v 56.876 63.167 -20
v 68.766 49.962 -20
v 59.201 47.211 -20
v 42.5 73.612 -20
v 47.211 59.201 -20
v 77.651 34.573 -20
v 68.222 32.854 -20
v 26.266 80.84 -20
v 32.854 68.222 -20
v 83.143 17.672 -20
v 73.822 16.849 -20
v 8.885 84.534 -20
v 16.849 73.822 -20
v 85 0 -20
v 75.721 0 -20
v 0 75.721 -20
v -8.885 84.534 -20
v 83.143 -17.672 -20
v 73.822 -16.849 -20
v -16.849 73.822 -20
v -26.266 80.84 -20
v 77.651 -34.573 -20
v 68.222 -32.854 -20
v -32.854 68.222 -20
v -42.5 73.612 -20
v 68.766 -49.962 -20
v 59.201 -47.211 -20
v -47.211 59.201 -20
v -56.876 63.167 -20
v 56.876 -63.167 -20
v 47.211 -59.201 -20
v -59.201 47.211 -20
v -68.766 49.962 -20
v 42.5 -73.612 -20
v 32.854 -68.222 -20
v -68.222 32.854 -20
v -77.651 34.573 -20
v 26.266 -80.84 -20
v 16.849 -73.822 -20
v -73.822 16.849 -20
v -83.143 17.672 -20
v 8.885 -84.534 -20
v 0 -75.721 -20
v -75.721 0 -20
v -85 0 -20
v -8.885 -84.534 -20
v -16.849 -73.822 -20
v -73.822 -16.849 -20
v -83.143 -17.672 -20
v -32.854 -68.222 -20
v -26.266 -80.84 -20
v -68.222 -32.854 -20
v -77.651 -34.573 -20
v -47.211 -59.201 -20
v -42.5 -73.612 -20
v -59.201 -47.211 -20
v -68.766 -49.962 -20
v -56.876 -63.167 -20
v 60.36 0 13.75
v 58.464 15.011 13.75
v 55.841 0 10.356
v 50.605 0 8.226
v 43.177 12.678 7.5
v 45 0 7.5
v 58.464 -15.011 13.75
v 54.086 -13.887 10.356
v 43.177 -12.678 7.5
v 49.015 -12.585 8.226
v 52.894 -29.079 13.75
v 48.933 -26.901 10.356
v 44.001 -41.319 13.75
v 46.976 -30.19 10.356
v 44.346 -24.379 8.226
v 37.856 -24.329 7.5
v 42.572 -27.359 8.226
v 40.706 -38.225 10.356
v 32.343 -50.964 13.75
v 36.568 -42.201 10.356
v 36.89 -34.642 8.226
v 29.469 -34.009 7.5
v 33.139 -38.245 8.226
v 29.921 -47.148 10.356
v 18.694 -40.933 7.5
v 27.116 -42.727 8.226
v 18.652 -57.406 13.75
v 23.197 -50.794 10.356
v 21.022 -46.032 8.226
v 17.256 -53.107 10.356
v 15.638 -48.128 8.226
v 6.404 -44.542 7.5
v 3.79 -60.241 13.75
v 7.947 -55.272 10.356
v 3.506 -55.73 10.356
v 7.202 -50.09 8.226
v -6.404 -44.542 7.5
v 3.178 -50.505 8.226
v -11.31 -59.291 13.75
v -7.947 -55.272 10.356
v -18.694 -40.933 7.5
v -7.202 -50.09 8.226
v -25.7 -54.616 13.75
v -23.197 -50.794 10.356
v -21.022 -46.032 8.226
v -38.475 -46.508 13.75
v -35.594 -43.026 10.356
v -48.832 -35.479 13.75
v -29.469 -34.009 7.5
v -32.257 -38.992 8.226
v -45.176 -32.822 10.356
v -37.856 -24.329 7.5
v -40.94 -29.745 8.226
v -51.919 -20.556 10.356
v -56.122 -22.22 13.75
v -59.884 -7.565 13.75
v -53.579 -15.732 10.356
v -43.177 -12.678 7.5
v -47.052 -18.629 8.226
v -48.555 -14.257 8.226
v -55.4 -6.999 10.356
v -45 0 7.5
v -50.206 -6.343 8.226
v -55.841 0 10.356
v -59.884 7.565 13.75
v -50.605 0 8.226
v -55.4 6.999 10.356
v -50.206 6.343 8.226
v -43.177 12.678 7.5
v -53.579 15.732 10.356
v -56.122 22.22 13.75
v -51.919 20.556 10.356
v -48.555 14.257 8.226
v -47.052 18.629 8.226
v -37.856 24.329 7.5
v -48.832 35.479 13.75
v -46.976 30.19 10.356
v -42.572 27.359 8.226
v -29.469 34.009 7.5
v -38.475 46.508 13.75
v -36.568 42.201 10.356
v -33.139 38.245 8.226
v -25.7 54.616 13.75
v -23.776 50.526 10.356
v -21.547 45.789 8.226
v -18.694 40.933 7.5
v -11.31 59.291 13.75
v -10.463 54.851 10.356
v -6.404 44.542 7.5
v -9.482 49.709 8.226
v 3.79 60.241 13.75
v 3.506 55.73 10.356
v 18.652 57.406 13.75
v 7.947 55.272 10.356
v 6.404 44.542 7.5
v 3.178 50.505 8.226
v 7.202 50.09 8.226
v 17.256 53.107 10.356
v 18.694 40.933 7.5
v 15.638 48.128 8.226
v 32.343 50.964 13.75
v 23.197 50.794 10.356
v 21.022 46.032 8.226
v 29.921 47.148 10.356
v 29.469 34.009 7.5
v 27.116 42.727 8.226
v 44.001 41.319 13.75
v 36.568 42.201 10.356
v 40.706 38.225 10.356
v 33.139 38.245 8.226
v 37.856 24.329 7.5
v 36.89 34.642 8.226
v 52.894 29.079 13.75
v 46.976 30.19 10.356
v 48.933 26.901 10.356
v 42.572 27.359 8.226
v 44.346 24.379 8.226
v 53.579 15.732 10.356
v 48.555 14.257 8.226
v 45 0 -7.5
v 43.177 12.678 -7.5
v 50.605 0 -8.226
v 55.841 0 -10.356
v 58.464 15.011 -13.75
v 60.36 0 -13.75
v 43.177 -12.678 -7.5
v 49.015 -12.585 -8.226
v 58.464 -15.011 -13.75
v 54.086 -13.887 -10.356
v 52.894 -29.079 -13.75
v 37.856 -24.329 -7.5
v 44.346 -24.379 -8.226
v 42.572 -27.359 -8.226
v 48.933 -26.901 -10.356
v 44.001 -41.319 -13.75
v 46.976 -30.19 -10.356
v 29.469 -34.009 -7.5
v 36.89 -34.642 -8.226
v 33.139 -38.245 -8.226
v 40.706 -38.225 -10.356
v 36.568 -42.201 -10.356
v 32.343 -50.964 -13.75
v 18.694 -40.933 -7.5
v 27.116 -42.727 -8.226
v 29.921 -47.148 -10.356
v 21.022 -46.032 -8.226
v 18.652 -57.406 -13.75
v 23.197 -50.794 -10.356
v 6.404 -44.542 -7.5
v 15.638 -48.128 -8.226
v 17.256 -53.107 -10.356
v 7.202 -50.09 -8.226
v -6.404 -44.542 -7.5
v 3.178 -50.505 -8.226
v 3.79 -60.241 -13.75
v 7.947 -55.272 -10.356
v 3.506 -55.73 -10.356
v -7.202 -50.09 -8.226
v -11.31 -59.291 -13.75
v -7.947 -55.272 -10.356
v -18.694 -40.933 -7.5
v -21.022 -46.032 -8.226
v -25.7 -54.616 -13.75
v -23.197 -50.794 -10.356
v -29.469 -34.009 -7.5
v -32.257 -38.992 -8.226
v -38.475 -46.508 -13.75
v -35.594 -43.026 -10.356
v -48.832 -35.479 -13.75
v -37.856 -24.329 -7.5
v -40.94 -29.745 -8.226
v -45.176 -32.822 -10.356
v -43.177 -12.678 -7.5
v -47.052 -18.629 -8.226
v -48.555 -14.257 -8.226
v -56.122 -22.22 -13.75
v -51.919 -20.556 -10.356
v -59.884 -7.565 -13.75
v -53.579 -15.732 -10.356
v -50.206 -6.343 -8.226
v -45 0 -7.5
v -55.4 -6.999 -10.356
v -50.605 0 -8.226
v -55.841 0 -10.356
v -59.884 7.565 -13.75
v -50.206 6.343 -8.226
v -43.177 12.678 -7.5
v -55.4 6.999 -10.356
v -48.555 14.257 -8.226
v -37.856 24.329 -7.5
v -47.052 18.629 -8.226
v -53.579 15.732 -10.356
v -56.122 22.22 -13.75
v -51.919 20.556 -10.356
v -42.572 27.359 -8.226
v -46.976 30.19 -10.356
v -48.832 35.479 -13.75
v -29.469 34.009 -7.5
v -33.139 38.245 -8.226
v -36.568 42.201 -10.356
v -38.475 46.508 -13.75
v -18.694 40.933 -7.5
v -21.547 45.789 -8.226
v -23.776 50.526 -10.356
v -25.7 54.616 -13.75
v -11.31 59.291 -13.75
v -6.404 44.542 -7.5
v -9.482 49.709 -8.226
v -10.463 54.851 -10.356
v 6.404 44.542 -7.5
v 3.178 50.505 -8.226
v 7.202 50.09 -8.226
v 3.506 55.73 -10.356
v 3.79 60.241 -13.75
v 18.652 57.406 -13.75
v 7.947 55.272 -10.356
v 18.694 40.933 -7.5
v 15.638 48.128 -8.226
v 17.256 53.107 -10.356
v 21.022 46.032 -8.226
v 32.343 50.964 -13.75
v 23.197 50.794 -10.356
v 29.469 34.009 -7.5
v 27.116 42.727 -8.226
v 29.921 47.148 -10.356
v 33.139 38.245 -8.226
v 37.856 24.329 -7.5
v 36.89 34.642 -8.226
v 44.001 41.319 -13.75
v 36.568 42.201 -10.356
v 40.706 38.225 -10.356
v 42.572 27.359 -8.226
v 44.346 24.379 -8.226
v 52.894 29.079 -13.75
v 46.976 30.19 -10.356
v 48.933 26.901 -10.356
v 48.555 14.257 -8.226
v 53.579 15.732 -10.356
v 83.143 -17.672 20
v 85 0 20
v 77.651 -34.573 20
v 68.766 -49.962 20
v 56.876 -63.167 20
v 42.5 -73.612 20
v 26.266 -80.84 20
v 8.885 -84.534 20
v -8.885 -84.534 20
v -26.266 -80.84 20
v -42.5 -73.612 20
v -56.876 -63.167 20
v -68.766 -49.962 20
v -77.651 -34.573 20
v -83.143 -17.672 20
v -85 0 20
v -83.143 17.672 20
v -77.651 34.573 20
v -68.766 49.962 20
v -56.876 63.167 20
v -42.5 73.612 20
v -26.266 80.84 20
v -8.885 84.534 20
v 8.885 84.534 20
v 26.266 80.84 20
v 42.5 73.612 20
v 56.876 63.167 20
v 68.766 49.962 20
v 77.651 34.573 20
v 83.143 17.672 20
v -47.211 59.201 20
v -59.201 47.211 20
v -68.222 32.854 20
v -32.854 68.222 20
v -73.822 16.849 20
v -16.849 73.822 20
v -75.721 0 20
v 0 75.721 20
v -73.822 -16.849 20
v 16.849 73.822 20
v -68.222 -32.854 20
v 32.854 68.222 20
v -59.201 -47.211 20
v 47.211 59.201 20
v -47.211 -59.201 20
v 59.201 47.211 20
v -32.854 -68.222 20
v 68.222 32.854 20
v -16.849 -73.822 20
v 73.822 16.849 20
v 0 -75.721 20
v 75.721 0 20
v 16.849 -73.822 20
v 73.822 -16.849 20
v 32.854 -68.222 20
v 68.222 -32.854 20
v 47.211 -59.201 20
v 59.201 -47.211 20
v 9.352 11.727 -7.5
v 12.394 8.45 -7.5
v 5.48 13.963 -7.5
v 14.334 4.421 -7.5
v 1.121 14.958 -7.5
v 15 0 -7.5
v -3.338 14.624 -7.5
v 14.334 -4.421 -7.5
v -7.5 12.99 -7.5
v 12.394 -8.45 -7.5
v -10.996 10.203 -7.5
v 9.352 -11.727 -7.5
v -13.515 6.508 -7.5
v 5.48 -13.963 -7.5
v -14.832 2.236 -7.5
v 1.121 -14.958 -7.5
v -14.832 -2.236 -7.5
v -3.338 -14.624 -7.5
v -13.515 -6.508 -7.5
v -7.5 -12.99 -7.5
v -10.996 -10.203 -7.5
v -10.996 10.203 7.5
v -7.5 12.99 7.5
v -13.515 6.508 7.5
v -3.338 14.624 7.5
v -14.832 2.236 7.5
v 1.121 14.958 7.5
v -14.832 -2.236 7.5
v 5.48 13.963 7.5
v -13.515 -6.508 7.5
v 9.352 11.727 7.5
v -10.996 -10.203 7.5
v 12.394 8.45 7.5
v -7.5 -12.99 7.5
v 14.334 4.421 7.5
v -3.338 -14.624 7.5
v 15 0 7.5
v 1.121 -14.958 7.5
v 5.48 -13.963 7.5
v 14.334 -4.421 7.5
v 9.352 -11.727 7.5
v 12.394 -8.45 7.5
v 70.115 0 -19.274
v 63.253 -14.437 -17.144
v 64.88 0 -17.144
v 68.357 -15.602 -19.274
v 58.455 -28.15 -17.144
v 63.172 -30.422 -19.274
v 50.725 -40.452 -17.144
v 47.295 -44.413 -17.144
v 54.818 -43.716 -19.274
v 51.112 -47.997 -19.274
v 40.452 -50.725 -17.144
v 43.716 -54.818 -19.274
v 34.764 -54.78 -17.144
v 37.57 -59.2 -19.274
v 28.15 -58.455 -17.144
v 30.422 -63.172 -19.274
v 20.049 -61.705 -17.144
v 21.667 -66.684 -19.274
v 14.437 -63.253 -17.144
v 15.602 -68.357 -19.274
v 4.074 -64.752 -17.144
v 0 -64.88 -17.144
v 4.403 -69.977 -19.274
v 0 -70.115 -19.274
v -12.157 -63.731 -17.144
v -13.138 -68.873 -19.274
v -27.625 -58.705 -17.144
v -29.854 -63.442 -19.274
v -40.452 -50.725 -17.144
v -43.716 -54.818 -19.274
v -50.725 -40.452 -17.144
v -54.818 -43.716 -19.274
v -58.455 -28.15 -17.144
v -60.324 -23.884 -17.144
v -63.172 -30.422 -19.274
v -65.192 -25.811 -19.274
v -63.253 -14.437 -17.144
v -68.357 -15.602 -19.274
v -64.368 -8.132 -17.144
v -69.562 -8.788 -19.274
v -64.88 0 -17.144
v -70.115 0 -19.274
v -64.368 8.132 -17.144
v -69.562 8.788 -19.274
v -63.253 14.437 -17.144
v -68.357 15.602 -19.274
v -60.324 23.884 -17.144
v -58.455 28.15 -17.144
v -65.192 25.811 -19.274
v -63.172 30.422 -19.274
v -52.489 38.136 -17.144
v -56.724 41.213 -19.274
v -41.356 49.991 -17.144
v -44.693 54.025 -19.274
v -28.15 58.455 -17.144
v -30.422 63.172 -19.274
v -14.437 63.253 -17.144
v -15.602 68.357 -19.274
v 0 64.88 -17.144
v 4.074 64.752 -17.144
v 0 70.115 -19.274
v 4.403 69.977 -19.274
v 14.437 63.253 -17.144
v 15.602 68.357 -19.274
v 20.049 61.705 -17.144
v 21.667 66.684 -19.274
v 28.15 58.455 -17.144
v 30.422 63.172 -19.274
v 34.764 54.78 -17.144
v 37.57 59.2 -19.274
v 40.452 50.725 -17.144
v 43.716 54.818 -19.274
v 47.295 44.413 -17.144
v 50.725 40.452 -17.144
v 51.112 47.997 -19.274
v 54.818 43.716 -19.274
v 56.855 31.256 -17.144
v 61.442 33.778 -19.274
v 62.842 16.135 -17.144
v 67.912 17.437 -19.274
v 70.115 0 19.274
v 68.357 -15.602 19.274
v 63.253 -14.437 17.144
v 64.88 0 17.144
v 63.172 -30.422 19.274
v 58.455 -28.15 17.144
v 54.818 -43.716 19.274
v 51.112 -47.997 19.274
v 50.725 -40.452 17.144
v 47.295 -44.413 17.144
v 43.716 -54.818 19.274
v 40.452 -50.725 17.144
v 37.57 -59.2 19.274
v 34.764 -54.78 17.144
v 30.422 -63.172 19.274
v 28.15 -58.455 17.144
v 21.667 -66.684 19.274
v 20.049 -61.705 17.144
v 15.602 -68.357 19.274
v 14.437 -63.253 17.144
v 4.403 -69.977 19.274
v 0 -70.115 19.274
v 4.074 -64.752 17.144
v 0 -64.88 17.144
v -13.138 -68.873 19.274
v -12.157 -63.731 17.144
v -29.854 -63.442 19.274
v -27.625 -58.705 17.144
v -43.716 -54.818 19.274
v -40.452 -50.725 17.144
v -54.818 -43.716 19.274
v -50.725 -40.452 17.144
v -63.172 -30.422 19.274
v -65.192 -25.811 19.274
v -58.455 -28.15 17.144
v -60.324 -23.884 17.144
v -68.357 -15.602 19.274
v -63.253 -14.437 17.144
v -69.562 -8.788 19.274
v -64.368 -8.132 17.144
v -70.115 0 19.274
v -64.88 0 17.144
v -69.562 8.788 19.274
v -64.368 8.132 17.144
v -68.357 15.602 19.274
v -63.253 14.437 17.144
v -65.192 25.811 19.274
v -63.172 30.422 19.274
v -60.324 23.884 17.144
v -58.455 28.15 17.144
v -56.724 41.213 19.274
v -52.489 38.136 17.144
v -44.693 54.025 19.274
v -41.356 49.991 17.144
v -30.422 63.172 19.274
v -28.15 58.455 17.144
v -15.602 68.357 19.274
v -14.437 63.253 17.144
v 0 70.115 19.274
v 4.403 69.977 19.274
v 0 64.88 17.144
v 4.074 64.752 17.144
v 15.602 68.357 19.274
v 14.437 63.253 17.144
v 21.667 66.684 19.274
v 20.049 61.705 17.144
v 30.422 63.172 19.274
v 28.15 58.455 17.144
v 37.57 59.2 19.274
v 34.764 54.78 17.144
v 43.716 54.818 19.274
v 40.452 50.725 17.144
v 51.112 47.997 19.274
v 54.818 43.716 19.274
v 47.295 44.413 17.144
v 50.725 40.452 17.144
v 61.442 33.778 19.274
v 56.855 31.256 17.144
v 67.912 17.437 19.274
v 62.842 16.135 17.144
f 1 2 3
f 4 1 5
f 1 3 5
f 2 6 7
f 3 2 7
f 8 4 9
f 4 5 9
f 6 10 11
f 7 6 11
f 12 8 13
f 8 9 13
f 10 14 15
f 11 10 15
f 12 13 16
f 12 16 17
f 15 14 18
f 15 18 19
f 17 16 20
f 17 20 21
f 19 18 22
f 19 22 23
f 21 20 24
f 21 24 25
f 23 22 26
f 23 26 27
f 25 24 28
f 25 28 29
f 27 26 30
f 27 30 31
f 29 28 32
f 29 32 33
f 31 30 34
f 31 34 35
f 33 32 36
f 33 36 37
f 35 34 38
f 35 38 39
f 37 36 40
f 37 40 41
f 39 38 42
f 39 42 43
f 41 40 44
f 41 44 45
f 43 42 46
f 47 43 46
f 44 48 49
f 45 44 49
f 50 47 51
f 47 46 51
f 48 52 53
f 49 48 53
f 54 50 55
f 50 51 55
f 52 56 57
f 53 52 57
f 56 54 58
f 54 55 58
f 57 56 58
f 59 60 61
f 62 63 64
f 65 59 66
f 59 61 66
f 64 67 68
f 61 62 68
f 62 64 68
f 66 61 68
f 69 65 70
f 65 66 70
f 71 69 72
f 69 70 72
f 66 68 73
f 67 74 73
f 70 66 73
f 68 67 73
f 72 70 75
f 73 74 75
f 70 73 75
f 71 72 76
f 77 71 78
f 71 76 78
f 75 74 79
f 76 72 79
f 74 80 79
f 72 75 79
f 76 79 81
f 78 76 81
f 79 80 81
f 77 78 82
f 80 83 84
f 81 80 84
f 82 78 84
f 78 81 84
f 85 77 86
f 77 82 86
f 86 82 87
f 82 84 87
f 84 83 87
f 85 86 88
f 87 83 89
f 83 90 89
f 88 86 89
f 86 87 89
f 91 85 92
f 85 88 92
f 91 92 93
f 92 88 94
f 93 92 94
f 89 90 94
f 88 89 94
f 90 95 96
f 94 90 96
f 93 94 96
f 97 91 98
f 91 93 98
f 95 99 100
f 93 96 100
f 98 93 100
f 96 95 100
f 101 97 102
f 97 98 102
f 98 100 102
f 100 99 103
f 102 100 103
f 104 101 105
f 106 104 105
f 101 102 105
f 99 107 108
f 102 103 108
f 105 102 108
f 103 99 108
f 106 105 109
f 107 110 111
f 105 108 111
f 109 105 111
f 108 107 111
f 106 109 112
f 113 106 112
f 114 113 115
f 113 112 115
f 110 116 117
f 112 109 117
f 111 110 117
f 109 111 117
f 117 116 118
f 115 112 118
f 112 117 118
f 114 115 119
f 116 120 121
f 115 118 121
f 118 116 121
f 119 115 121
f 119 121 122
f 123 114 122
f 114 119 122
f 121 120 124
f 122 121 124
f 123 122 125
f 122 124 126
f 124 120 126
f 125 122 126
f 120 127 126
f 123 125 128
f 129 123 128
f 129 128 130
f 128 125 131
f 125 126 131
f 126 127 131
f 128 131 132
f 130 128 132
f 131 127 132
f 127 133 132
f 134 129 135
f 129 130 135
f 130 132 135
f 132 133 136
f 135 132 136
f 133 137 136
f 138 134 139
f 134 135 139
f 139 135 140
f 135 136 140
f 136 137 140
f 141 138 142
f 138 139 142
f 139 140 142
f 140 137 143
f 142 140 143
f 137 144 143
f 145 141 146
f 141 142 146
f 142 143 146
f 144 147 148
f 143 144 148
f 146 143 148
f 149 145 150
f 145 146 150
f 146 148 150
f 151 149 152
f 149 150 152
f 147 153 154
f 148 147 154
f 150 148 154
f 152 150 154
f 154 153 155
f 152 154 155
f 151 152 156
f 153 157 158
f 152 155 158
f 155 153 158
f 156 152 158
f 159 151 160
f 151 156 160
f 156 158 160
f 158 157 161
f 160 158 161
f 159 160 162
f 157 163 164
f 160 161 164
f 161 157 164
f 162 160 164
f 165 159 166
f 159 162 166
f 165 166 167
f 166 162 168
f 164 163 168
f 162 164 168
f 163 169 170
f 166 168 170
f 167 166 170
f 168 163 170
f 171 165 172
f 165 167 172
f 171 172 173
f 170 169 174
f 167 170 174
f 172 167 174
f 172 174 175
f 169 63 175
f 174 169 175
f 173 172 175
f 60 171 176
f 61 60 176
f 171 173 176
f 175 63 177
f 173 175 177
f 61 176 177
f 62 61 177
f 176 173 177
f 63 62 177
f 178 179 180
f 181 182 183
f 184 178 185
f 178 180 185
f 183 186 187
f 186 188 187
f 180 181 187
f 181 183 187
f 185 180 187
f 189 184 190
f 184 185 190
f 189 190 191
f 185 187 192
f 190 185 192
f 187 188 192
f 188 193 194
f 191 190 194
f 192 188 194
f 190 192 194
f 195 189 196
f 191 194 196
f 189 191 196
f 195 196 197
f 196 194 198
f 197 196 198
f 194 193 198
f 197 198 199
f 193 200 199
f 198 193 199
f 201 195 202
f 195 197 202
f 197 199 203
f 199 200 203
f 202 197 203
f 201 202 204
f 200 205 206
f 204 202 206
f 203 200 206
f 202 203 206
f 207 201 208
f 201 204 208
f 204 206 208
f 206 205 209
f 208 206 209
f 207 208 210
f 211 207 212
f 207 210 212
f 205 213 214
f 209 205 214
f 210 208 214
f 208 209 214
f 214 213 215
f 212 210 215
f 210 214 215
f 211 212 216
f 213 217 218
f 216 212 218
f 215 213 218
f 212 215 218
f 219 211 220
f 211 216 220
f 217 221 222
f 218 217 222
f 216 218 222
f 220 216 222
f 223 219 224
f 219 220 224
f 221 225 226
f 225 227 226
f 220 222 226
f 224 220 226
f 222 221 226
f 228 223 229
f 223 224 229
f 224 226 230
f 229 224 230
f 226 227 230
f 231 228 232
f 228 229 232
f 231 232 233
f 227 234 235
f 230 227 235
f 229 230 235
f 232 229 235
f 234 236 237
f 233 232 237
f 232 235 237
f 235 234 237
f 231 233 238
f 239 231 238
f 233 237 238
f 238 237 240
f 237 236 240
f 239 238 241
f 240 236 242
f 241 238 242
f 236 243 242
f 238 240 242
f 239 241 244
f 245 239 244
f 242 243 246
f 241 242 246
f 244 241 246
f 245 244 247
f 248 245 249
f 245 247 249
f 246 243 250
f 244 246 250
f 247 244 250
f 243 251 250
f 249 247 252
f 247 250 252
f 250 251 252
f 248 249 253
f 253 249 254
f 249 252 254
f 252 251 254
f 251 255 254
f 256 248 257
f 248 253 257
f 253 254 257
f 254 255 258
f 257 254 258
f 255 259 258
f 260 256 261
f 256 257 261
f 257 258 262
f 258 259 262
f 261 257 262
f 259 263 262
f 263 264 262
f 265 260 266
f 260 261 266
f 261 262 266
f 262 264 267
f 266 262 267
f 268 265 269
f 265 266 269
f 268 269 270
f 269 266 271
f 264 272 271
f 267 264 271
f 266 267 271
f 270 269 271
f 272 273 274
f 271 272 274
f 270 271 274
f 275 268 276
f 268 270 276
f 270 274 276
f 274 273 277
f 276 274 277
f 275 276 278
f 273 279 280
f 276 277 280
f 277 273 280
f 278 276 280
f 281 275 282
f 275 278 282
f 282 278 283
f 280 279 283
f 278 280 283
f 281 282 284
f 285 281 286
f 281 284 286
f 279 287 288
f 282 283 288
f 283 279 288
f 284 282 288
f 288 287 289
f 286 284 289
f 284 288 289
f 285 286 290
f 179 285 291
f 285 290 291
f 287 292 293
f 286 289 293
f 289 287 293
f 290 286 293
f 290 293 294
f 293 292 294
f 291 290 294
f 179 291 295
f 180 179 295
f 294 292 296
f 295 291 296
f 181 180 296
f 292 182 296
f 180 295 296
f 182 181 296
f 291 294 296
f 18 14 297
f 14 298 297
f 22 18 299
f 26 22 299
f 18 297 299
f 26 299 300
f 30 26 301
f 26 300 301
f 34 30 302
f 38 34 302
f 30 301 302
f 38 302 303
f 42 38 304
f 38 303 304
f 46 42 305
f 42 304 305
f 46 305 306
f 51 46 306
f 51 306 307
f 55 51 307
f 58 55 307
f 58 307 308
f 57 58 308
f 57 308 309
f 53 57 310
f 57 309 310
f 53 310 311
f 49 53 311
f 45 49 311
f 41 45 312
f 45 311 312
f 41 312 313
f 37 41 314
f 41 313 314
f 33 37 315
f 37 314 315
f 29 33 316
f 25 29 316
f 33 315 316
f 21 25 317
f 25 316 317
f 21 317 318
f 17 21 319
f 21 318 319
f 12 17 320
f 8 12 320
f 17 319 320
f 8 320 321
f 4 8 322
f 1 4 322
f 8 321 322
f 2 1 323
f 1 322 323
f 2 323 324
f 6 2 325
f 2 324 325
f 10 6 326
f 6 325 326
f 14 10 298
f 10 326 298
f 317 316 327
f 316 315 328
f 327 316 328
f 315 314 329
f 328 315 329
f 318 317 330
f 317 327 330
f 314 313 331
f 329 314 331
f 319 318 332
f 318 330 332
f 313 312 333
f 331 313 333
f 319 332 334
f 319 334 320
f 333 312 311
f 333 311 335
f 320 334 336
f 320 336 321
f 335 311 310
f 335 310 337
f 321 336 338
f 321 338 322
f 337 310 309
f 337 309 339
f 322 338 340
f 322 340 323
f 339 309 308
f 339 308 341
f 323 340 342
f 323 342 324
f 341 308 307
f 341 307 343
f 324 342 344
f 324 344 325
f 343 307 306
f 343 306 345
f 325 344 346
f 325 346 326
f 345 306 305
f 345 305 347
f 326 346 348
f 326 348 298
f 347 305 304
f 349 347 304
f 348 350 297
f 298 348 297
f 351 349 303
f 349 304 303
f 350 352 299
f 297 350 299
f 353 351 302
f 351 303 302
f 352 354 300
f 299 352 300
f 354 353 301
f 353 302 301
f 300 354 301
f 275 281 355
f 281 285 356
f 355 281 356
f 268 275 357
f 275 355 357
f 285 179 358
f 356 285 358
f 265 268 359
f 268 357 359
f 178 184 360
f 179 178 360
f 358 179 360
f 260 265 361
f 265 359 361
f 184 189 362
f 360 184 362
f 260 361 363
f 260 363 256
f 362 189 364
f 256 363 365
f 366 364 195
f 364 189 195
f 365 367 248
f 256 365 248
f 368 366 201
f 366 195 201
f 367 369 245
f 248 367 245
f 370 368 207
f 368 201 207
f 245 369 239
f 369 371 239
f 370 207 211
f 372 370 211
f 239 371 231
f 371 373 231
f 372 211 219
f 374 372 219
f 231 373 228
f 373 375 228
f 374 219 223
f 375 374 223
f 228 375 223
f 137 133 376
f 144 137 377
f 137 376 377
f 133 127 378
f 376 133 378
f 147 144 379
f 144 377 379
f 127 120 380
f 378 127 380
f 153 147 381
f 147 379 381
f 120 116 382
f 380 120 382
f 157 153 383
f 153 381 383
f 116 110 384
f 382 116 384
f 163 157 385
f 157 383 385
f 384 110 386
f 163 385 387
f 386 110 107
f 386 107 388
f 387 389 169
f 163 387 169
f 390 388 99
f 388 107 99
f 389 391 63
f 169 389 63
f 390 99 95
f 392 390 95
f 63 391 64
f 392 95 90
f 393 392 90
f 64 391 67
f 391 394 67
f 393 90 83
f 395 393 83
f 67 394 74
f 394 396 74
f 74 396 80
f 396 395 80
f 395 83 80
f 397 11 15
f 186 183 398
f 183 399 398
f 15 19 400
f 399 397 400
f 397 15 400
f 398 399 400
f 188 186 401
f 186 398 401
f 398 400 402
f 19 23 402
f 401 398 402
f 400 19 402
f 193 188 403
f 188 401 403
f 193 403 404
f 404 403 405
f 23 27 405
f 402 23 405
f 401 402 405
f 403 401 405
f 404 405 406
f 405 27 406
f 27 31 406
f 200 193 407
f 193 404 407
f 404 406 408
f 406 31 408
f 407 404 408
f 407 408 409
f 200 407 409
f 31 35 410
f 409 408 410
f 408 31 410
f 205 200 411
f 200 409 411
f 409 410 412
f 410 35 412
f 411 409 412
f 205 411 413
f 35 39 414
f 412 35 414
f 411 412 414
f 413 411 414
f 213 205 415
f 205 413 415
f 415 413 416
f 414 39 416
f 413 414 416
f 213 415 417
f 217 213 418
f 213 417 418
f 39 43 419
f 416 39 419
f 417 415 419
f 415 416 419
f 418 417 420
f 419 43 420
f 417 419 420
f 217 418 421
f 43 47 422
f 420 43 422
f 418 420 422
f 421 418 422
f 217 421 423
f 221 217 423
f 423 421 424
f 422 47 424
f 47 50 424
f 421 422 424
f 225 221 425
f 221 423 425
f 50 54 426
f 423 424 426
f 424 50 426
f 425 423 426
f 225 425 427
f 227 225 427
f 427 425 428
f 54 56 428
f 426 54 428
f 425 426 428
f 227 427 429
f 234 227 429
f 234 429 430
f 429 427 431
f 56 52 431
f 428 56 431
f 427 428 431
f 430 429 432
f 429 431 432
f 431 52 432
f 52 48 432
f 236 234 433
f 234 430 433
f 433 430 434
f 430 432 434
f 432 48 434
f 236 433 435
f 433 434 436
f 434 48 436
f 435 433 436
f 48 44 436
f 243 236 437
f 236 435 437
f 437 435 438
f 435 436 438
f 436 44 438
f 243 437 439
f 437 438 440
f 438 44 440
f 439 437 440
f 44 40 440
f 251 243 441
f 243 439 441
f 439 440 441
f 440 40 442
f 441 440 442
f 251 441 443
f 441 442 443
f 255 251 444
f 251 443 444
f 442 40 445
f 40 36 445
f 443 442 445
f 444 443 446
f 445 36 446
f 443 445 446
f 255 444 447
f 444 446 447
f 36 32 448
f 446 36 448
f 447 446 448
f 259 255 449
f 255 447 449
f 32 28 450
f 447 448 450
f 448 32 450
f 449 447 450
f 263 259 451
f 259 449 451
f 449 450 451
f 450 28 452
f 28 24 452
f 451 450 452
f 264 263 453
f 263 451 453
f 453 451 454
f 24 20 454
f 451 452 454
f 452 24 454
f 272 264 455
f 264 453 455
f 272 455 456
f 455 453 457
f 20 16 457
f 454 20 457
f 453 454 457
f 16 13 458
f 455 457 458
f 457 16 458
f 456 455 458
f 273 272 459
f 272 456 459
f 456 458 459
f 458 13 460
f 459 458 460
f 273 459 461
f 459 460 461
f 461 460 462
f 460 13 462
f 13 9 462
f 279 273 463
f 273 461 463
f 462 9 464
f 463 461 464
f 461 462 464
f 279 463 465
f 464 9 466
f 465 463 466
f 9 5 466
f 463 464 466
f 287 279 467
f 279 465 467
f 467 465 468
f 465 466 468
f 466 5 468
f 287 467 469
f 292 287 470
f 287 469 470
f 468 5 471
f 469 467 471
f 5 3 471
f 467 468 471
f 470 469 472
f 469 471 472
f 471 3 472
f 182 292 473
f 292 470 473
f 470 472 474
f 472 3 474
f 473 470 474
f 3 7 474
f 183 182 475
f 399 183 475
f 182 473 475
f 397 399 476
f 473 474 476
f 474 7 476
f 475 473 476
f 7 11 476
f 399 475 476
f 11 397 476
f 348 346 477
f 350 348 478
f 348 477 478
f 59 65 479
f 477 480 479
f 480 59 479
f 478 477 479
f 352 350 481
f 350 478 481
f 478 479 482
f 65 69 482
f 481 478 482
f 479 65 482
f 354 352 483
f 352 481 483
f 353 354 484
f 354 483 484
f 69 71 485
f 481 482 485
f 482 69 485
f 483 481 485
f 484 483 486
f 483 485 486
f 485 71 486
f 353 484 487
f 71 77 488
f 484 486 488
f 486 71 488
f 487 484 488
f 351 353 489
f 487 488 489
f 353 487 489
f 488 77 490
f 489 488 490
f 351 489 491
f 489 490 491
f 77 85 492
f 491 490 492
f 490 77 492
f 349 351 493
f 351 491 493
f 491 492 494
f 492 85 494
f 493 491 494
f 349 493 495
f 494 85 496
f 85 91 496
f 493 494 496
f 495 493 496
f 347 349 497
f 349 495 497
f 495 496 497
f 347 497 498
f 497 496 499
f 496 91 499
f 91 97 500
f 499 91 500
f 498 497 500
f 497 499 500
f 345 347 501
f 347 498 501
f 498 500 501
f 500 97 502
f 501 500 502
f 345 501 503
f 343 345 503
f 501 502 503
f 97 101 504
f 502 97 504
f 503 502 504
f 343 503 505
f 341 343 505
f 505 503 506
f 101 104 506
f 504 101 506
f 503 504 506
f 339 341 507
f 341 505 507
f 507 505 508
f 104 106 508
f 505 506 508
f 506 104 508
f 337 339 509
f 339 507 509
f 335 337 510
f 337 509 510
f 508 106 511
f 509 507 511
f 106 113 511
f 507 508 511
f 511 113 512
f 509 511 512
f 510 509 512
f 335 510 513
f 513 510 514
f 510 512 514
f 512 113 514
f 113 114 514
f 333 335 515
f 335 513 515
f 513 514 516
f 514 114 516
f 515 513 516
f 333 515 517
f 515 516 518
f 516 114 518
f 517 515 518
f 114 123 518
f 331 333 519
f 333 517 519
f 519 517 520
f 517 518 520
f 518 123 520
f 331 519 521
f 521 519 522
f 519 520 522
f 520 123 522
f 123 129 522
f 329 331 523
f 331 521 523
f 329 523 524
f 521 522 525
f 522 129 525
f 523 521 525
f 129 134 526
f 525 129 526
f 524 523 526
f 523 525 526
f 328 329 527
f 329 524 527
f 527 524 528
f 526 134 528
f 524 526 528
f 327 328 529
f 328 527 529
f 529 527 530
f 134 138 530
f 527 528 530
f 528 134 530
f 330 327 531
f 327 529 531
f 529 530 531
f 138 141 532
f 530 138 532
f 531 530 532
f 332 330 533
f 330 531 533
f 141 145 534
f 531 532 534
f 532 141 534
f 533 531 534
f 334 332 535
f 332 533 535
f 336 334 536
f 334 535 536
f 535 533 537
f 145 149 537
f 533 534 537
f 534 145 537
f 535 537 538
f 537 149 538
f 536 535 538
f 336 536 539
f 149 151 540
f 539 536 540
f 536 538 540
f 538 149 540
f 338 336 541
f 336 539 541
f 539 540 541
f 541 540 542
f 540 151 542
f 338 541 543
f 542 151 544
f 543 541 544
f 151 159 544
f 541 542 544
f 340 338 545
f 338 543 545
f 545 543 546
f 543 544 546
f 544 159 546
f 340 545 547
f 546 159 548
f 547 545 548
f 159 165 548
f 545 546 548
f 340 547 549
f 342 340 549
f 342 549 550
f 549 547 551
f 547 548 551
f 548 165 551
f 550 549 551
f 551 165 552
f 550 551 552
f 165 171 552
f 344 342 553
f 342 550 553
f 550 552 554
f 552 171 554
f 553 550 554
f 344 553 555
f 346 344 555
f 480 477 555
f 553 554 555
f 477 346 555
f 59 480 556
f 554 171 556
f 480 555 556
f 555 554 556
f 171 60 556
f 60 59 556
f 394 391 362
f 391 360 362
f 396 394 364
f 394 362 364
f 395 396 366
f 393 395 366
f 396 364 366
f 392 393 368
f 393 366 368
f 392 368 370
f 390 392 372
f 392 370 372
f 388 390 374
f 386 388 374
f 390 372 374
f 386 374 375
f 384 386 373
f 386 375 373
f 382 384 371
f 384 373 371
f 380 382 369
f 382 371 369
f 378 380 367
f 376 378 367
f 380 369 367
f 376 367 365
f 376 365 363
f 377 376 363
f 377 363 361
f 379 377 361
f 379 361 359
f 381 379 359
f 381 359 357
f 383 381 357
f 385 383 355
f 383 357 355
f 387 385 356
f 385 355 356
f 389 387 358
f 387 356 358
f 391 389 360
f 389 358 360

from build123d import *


with BuildPart() as part:
    # Croquis2 → Revolución1 (revolve)
    with BuildSketch(Plane(origin=(0, 0, 0), x_dir=(1, 0, 0), z_dir=(0, 1, 0))):
        with BuildLine():
            Line((15, -7.5), (15, 7.5))
            Line((15, 7.5), (45, 7.5))
            ThreePointArc((45, 7.5), (53.291561976, 9.122316128), (60.360257159, 13.75))
            ThreePointArc((60.360257159, 13.75), (67.428952343, 18.377683872), (75.720514319, 20))
            Line((75.720514319, 20), (85, 20))
            Line((85, 20), (85, -20))
            Line((85, -20), (75.720514319, -20))
            ThreePointArc((75.720514319, -20), (67.428952343, -18.377683872), (60.360257159, -13.75))
            ThreePointArc((60.360257159, -13.75), (53.291561976, -9.122316128), (45, -7.5))
            Line((45, -7.5), (15, -7.5))
        make_face()
    revolve(axis=Axis((0, 0, 0), (0, 0, -1)))


solid = part.part
